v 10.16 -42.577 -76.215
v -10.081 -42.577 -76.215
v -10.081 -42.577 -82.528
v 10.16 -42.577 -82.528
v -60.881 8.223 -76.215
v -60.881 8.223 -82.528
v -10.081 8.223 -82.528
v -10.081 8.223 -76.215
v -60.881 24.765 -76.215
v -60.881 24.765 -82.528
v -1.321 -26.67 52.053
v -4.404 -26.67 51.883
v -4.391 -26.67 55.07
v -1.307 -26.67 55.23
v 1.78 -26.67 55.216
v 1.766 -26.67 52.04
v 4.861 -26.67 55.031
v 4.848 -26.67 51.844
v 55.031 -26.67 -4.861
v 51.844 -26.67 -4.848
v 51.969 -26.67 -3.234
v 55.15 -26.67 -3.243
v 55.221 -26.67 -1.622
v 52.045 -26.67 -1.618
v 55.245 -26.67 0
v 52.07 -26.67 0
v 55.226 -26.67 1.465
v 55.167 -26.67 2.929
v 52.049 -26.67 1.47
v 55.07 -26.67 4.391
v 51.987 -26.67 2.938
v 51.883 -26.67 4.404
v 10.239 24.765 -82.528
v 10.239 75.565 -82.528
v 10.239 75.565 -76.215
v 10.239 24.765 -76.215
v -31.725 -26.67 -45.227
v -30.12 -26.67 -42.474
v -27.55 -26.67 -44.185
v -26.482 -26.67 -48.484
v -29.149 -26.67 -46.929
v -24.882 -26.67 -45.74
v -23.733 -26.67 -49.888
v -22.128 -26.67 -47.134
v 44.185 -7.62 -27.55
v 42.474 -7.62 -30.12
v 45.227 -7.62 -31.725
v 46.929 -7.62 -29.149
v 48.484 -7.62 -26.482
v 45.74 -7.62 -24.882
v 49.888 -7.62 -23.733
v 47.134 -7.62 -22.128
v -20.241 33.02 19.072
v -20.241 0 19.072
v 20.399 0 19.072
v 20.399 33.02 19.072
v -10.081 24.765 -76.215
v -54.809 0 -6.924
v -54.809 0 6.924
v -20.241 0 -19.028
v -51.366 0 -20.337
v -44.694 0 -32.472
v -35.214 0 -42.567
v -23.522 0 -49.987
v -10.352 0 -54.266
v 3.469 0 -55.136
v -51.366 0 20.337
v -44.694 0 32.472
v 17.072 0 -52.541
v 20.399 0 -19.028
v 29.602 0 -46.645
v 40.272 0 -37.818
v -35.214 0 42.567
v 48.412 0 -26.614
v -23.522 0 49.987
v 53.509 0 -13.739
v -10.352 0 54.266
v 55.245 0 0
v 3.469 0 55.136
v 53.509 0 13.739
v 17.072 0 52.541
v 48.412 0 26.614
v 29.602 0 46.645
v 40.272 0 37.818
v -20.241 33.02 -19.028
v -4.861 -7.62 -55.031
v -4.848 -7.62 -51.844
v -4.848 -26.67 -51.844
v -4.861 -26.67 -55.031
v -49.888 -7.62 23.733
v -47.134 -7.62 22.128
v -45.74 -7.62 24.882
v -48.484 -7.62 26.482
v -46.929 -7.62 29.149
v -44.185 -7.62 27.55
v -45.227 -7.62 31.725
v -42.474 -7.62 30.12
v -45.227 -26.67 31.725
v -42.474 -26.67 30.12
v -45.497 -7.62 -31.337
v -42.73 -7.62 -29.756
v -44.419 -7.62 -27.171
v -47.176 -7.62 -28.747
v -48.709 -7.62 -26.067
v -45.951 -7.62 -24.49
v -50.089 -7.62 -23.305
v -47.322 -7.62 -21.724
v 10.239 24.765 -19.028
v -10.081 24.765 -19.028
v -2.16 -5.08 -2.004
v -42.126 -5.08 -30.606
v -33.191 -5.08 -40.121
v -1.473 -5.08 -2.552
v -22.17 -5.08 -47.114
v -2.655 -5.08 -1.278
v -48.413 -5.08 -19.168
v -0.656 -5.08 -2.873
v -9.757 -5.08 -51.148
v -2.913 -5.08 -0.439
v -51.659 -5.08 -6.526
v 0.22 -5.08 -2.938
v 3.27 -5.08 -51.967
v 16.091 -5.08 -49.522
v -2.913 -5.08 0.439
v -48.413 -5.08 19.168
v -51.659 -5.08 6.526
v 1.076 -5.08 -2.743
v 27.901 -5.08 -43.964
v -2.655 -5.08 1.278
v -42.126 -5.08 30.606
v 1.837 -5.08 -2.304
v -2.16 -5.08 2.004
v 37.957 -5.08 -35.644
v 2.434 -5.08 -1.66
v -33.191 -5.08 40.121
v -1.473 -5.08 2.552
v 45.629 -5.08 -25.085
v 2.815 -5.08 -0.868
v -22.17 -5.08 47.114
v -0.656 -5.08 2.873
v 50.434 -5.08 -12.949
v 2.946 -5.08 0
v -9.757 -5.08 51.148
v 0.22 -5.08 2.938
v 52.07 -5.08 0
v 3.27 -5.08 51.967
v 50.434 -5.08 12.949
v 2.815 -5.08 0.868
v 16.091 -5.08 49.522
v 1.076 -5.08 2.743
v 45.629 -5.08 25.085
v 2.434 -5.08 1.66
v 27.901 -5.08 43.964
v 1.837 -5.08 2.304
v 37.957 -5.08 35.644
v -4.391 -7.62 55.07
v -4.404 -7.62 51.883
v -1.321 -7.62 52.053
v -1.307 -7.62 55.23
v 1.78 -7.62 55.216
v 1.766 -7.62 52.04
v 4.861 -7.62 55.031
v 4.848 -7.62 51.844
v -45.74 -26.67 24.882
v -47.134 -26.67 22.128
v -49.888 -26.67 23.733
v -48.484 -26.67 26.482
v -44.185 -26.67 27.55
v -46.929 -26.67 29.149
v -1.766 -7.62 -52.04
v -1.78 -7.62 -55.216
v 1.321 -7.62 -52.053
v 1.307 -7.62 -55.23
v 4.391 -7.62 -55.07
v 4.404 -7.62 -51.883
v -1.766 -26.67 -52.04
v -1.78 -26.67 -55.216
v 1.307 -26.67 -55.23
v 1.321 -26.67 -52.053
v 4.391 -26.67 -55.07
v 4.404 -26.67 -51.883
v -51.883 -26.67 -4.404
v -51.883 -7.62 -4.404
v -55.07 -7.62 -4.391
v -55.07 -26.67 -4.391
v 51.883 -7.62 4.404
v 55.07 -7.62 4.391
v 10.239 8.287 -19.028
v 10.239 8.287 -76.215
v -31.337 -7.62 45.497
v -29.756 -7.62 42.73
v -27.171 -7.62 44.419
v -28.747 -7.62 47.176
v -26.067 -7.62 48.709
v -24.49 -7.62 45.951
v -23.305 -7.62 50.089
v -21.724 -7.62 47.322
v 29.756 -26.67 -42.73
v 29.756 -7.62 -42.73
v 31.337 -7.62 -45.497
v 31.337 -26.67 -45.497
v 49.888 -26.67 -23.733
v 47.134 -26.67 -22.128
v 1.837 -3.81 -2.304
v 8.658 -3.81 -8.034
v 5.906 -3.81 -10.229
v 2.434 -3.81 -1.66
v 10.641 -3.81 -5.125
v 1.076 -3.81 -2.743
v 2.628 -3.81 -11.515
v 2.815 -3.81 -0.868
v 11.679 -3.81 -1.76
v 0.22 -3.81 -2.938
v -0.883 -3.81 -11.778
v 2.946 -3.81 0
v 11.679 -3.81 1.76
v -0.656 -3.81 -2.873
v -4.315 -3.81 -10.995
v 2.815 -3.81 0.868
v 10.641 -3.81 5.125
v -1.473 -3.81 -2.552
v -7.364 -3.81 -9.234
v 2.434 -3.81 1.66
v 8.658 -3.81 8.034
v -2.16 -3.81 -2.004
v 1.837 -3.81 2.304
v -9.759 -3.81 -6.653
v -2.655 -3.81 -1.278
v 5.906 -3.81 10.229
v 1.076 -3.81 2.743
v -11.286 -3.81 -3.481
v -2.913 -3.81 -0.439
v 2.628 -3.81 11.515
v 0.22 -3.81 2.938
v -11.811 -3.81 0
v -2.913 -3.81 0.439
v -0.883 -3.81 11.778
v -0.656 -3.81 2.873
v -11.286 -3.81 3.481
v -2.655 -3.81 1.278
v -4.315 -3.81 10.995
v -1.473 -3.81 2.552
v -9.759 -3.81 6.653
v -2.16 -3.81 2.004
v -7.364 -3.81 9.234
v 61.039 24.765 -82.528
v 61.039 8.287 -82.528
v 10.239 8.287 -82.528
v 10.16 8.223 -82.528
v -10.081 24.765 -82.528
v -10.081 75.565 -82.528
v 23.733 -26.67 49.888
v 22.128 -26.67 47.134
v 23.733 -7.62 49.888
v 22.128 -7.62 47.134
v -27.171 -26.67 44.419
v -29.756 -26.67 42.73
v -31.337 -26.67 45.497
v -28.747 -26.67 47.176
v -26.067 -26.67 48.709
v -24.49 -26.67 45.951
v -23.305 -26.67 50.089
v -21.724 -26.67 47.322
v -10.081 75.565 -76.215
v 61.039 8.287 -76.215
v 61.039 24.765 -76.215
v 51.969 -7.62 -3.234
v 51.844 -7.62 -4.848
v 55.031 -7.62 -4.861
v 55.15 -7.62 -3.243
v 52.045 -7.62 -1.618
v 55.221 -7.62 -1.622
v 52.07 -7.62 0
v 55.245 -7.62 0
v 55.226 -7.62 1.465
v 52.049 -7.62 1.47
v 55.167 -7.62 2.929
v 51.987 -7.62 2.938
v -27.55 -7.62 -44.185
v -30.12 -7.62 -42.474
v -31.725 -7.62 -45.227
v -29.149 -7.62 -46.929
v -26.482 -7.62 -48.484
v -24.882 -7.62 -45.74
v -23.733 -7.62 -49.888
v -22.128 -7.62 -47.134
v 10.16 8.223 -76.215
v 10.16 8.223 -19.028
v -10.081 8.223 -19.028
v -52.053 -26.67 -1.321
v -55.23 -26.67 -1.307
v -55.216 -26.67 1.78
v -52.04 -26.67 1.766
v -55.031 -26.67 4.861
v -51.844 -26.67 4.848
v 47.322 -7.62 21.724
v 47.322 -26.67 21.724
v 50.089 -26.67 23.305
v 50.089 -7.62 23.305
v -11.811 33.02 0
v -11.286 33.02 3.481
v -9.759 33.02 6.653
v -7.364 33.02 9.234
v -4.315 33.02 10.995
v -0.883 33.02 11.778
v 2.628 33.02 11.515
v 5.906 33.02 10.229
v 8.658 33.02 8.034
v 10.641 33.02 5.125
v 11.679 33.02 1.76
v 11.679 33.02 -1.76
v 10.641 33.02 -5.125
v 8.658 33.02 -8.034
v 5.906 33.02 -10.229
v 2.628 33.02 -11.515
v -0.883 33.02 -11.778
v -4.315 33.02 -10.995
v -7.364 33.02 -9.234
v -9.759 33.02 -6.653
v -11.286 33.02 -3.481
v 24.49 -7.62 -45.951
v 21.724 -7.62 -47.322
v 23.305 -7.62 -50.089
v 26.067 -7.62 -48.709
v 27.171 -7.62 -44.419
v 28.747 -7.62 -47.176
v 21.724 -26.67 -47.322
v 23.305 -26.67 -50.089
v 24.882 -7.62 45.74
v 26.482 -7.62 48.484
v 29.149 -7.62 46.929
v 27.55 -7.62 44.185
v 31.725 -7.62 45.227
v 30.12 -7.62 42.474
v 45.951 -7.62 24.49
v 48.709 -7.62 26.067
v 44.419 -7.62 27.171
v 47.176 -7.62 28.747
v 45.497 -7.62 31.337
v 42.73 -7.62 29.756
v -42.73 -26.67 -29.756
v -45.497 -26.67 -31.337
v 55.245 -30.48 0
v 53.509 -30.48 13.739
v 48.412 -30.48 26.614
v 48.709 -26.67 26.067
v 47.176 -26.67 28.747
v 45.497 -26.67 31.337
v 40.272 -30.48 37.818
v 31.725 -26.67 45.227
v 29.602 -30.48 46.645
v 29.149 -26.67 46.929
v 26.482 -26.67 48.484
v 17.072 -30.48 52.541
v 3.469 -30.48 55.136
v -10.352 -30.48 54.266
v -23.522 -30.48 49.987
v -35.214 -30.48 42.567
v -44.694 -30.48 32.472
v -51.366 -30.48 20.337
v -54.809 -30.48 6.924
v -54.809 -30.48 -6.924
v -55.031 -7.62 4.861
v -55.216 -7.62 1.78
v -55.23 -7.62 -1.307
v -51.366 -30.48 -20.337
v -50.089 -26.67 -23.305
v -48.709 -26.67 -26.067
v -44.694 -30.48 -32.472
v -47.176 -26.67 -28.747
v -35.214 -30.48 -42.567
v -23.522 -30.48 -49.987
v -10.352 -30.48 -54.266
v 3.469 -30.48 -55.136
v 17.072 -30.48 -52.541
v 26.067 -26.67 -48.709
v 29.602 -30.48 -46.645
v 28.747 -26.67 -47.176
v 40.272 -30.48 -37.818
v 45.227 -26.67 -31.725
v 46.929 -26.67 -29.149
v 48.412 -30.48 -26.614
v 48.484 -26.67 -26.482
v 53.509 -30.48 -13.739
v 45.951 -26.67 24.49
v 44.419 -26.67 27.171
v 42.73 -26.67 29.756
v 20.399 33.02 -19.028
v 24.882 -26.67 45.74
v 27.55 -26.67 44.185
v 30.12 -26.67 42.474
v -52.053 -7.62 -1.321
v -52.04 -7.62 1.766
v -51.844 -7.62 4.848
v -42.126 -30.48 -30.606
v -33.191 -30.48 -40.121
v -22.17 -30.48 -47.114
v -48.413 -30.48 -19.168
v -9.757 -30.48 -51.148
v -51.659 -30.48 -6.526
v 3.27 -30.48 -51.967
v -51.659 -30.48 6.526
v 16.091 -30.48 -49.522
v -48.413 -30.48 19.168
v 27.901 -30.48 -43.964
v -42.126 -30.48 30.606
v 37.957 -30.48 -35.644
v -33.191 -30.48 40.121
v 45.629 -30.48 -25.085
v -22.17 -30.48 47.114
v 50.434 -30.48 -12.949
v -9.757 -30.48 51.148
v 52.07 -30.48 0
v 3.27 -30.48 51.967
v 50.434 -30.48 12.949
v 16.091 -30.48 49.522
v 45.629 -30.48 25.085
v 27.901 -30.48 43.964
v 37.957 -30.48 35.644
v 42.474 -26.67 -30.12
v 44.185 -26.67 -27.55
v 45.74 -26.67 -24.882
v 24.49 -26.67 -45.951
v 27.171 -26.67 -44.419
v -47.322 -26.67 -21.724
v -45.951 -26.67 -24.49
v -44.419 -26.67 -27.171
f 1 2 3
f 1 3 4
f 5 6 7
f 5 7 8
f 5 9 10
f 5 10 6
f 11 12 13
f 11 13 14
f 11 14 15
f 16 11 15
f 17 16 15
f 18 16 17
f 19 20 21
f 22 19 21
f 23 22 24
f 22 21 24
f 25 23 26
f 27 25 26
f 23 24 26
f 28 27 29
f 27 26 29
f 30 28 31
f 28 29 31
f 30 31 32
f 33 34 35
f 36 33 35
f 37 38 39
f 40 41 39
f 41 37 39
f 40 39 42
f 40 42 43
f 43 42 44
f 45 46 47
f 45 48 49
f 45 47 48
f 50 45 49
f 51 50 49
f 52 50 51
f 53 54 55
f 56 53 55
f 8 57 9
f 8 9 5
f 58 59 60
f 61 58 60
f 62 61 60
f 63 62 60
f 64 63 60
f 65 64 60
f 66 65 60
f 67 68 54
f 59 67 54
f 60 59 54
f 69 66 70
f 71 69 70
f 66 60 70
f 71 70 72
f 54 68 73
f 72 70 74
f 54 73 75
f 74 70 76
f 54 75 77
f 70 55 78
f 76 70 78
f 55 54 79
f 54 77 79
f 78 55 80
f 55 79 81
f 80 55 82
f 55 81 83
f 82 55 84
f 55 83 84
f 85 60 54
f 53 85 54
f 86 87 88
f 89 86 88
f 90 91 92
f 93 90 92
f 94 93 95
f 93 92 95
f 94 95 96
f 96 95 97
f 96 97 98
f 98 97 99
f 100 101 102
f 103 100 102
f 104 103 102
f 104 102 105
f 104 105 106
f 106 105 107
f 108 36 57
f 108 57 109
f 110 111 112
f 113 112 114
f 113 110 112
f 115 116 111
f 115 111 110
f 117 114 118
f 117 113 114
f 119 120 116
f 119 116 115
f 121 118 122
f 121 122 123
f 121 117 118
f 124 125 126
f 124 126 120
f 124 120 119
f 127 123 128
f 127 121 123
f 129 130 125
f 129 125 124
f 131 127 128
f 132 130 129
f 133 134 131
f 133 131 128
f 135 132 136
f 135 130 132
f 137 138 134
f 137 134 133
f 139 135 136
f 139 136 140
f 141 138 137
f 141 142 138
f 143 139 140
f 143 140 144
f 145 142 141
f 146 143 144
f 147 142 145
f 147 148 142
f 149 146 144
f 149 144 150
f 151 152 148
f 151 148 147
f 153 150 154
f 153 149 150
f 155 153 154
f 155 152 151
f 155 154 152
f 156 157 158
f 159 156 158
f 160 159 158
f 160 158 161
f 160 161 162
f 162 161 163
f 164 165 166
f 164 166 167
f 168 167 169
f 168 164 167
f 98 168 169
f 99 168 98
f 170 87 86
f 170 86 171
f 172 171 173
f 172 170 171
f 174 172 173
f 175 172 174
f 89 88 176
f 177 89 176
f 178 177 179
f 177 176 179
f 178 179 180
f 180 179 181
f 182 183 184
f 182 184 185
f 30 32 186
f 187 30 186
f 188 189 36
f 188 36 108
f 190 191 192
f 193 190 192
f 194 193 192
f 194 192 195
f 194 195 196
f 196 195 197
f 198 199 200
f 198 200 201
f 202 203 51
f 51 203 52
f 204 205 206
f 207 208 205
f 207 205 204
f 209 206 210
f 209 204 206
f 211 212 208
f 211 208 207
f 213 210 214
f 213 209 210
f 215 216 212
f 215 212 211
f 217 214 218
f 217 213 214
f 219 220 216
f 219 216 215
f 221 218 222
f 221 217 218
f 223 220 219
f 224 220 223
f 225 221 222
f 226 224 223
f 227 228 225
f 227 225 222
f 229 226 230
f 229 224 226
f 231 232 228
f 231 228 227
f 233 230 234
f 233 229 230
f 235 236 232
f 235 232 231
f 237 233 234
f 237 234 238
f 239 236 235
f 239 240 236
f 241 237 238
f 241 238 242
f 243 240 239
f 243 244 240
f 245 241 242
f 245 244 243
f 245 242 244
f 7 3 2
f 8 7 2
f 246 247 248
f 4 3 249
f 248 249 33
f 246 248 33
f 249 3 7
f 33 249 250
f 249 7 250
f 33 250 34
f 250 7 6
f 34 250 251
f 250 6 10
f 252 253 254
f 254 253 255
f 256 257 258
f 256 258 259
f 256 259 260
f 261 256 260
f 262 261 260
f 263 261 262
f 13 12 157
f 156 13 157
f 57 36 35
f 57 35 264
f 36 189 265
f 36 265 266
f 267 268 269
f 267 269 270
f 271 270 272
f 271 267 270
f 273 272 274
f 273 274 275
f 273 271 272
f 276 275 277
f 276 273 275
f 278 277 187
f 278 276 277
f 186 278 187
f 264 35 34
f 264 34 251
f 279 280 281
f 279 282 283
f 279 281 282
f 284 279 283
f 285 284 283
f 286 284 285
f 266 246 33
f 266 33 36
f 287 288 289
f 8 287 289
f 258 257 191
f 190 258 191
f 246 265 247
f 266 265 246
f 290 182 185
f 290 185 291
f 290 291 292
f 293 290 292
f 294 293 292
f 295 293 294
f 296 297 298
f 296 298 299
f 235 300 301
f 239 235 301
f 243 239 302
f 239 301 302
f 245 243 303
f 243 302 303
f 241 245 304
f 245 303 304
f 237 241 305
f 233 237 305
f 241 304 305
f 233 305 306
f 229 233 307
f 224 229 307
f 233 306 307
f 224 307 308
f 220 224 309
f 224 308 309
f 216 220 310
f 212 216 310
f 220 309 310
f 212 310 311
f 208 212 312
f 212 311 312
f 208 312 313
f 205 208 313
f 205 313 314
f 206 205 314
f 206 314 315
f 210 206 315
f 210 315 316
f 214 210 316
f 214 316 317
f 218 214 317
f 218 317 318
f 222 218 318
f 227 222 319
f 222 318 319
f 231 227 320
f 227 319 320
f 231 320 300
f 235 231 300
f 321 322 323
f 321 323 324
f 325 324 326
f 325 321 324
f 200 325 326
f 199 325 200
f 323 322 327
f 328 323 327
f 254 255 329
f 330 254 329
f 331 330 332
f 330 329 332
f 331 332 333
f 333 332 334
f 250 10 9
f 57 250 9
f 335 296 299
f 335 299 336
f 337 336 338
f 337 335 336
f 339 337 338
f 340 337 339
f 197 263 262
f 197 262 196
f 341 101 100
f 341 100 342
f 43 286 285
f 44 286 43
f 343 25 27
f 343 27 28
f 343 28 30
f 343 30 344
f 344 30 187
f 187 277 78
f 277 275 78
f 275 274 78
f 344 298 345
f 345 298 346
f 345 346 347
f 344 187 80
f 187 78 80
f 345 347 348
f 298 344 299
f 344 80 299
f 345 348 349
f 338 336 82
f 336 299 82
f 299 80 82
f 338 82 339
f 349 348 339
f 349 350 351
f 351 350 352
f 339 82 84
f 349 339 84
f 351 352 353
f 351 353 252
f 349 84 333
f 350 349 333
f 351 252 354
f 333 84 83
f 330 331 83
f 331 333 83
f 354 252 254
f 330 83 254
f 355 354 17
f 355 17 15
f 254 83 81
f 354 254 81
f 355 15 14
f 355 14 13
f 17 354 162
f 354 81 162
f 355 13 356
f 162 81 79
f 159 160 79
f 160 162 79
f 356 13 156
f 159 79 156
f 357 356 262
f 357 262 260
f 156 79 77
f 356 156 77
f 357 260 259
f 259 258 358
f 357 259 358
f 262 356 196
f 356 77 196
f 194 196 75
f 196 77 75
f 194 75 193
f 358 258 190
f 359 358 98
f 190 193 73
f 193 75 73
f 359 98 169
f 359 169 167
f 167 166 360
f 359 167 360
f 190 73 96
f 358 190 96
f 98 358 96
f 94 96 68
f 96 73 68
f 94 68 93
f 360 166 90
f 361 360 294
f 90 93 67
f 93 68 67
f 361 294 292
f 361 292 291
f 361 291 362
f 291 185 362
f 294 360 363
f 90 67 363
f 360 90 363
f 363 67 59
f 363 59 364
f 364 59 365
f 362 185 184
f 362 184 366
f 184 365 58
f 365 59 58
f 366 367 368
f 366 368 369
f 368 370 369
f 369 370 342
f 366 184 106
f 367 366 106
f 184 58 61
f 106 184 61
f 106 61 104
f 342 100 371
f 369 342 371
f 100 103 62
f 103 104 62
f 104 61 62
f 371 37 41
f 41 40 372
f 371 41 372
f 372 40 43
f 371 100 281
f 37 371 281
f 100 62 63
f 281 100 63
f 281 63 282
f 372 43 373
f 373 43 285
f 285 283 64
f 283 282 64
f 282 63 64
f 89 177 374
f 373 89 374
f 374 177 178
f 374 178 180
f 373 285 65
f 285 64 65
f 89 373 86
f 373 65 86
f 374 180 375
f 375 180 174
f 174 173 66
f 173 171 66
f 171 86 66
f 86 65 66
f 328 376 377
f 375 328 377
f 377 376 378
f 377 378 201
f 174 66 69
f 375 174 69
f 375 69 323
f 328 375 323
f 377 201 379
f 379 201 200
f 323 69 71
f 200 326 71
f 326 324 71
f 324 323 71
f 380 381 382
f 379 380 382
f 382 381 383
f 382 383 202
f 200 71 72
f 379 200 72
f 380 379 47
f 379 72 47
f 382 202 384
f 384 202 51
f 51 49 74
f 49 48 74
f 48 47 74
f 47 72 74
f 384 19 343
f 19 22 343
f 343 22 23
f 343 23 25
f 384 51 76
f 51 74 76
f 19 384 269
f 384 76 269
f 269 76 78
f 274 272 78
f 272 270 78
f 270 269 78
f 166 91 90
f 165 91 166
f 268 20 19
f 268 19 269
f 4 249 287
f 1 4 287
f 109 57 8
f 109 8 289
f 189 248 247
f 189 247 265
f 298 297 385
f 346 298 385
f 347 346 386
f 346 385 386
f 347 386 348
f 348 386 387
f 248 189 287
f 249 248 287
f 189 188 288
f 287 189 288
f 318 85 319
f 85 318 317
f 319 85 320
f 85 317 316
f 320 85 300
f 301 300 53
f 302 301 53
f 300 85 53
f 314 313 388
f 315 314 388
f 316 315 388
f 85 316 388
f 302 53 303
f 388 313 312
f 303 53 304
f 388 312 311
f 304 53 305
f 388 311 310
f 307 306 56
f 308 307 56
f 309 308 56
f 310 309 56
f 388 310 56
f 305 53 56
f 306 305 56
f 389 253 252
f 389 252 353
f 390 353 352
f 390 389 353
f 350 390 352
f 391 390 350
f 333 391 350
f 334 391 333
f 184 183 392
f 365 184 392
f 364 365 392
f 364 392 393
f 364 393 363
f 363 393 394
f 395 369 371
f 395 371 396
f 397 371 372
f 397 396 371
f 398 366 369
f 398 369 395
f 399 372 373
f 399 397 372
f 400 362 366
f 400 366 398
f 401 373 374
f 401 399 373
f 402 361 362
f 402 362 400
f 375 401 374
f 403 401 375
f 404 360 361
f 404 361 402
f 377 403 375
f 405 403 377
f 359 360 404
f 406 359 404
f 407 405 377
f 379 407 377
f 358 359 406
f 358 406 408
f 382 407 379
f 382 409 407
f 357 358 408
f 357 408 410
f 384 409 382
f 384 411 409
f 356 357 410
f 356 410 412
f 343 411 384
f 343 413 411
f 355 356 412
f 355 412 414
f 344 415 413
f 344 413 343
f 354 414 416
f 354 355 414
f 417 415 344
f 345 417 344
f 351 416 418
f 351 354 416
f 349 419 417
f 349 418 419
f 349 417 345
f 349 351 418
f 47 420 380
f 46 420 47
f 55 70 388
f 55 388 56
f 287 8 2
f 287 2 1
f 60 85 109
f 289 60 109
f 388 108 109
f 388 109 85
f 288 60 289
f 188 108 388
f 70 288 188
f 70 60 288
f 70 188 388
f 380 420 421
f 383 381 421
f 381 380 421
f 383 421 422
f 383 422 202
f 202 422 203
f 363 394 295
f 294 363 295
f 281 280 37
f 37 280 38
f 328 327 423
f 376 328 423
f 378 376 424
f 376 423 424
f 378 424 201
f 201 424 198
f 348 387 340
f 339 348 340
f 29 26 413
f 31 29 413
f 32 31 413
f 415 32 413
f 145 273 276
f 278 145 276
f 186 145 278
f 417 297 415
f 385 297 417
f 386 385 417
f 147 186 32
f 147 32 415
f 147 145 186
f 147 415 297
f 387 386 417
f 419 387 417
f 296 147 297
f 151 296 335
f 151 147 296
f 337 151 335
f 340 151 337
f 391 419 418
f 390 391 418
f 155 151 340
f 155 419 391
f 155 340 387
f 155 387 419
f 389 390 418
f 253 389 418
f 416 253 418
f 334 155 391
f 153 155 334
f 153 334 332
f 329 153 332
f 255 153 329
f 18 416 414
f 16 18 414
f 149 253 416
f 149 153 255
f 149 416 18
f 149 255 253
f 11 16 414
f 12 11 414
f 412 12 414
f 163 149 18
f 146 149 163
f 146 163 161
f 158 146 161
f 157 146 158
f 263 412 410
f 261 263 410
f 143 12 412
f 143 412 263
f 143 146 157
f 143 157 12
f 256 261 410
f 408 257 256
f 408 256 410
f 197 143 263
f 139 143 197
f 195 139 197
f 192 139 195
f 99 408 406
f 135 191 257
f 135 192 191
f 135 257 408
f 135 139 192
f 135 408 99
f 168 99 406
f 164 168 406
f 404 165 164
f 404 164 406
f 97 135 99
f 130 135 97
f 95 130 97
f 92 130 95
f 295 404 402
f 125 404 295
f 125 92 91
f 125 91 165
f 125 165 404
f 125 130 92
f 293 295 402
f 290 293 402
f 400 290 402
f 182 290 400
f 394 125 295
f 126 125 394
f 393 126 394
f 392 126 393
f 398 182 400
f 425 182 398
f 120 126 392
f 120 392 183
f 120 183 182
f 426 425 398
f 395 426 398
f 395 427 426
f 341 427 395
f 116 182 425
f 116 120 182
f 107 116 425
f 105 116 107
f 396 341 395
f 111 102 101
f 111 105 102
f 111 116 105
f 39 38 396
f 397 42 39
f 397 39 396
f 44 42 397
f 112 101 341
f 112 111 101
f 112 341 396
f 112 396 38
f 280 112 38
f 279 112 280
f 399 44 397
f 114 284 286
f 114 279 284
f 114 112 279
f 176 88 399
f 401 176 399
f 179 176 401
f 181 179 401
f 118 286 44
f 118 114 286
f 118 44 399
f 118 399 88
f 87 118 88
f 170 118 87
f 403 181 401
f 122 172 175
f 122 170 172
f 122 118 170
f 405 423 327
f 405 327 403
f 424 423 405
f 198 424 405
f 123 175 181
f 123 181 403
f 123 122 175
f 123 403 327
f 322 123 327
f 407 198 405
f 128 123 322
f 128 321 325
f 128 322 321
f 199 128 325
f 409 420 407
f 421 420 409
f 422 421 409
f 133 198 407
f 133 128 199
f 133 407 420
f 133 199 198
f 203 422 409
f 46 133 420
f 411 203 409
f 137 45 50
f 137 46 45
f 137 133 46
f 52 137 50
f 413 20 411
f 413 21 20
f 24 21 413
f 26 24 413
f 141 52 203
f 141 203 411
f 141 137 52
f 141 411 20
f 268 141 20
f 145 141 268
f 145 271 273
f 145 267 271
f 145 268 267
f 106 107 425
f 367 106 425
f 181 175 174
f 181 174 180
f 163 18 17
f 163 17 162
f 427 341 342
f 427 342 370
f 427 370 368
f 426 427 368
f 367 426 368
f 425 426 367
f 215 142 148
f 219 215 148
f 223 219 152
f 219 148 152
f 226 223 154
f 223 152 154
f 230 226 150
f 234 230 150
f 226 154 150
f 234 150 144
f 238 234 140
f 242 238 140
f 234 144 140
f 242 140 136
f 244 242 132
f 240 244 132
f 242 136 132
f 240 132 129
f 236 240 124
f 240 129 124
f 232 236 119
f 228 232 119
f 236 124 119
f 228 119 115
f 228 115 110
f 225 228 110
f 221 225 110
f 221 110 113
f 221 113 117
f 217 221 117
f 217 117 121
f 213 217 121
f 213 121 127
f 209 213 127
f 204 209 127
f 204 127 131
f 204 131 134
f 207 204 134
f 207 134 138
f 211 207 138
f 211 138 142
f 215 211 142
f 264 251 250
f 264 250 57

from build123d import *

# Parameters (mm, degrees)
F0_R      = 52.07
F1_DEPTH  = 5.08
F0_R_2    = 55.245
F2_DEPTH  = 30.48
F4_DEPTH  = 21.59
F5_W      = 9.2520020868
F5_H      = 19.05
F6_DEPTH  = 50.8
F7_W      = 9.2520020868
F7_H      = 19.05
F8_DEPTH  = 50.8
F9_W      = 9.2520020868
F9_H      = 19.05
F10_DEPTH = 50.8
F11_W     = 19.05
F11_H     = 9.2520020868
F12_DEPTH = 50.8
F13_W     = 19.05
F13_H     = 9.2520020868
F14_DEPTH = 50.8
F15_W     = 19.05
F15_H     = 9.2520020868
F16_DEPTH = 50.8
F17_W     = 9.2520020868
F17_H     = 19.05
F18_DEPTH = 50.8
F19_W     = 9.2520020868
F19_H     = 19.05
F20_DEPTH = 50.8
F21_W     = 9.2520020868
F21_H     = 19.05
F22_DEPTH = 50.8
F23_W     = 19.05
F23_H     = 9.2520020868
F24_DEPTH = 50.8
F25_W     = 19.05
F25_H     = 9.2520020868
F26_DEPTH = 50.8
F27_W     = 19.05
F27_H     = 9.2520020868
F28_DEPTH = 50.8
F29_W     = 40.64
F29_H     = 38.1
F30_DEPTH = 33.02
F31_DEPTH = 21.59
F33_DEPTH = 63.5
F34_W     = 20.2407714686
F34_H     = 6.3127256824
F35_DEPTH = 50.8
F36_W     = 16.5421865909
F36_H     = 6.3127256824
F37_DEPTH = 50.8
F38_W     = 20.32
F38_H     = 6.3127256824
F39_DEPTH = 50.8
F40_W     = 16.4780624607
F40_H     = 6.3127256824
F41_DEPTH = 50.8
F43_R     = 2.9464
F44_DEPTH = 1.6256
F42_R     = 11.811
F45_DEPTH = 36.83


with BuildPart() as f1:
    # F0 (on Front) → F1 (new body)
    with BuildSketch(Plane.XZ):
        Circle(F0_R)
    extrude(amount=F1_DEPTH)

    # F0 (on Front) → F2 (join)
    with BuildSketch(Plane.XZ):
        Circle(F0_R_2)
        Circle(F0_R, mode=Mode.SUBTRACT)
    extrude(amount=F2_DEPTH)

    # F3 (on face) → F4 (join)
    with BuildSketch(Plane.XZ.offset(5.08)):
        Polygon((4.5521322669, -17.2840948262), (12.5843095976, -12.6923990675), (17.2445313344, -4.6997852286), (17.2840948262, 4.5521322669), (12.6923990675, 12.5843095976), (4.6997852286, 17.2445313344), (-4.5521322669, 17.2840948262), (-12.5843095976, 12.6923990675), (-17.2445313344, 4.6997852286), (-17.2840948262, -4.5521322669), (-12.6923990675, -12.5843095976), (-4.6997852286, -17.2445313344), align=None)
    extrude(amount=F4_DEPTH)

    # F5 (on face) → F6 (cut)
    with BuildSketch(Plane(origin=(8.696092148, 0, 14.914420466), x_dir=(0.8638793813, 0, -0.5036987339), z_dir=(0.5036987339, 0, 0.8638793813))):
        with Locations((0, -17.145)):
            Rectangle(F5_W, F5_H)
    extrude(amount=F6_DEPTH, mode=Mode.SUBTRACT)

    # F7 (on face) → F8 (cut)
    with BuildSketch(Plane(origin=(0.0738264808, 0, 17.2643130803), x_dir=(0.999990857, 0, -0.0042762087), z_dir=(0.0042762087, 0, 0.999990857))):
        with Locations((0, -17.145)):
            Rectangle(F7_W, F7_H)
    extrude(amount=F8_DEPTH, mode=Mode.SUBTRACT)

    # F9 (on face) → F10 (cut)
    with BuildSketch(Plane(origin=(-8.5682209323, 0, 14.9882469469), x_dir=(0.86815559, 0, 0.4962921231), z_dir=(-0.4962921231, 0, 0.86815559))):
        with Locations((0, -17.145)):
            Rectangle(F9_W, F9_H)
    extrude(amount=F10_DEPTH, mode=Mode.SUBTRACT)

    # F11 (on face) → F12 (cut)
    with BuildSketch(Plane(origin=(-14.914420466, 0, 8.696092148), x_dir=(0, -1, 0), z_dir=(-0.8638793813, 0, 0.5036987339))):
        with Locations((17.145, 0)):
            Rectangle(F11_W, F11_H)
    extrude(amount=F12_DEPTH, mode=Mode.SUBTRACT)

    # F13 (on face) → F14 (cut)
    with BuildSketch(Plane(origin=(-17.2643130803, 0, 0.0738264808), x_dir=(0, -1, 0), z_dir=(-0.999990857, 0, 0.0042762087))):
        with Locations((17.145, 0)):
            Rectangle(F13_W, F13_H)
    extrude(amount=F14_DEPTH, mode=Mode.SUBTRACT)

    # F15 (on face) → F16 (cut)
    with BuildSketch(Plane(origin=(-14.9882469469, 0, -8.5682209323), x_dir=(0, -1, 0), z_dir=(-0.86815559, 0, -0.4962921231))):
        with Locations((17.145, 0)):
            Rectangle(F15_W, F15_H)
    extrude(amount=F16_DEPTH, mode=Mode.SUBTRACT)

    # F17 (on face) → F18 (cut)
    with BuildSketch(Plane(origin=(-8.696092148, 0, -14.914420466), x_dir=(0.8638793813, 0, -0.5036987339), z_dir=(-0.5036987339, 0, -0.8638793813))):
        with Locations((0, 17.145)):
            Rectangle(F17_W, F17_H)
    extrude(amount=F18_DEPTH, mode=Mode.SUBTRACT)

    # F19 (on face) → F20 (cut)
    with BuildSketch(Plane(origin=(-0.0738264808, 0, -17.2643130803), x_dir=(0.999990857, 0, -0.0042762087), z_dir=(-0.0042762087, 0, -0.999990857))):
        with Locations((0, 17.145)):
            Rectangle(F19_W, F19_H)
    extrude(amount=F20_DEPTH, mode=Mode.SUBTRACT)

    # F21 (on face) → F22 (cut)
    with BuildSketch(Plane(origin=(8.5682209323, 0, -14.9882469469), x_dir=(0.86815559, 0, 0.4962921231), z_dir=(0.4962921231, 0, -0.86815559))):
        with Locations((0, 17.145)):
            Rectangle(F21_W, F21_H)
    extrude(amount=F22_DEPTH, mode=Mode.SUBTRACT)

    # F23 (on face) → F24 (cut)
    with BuildSketch(Plane(origin=(14.914420466, 0, -8.696092148), x_dir=(0, 1, 0), z_dir=(0.8638793813, 0, -0.5036987339))):
        with Locations((-17.145, 0)):
            Rectangle(F23_W, F23_H)
    extrude(amount=F24_DEPTH, mode=Mode.SUBTRACT)

    # F25 (on face) → F26 (cut)
    with BuildSketch(Plane(origin=(17.2643130803, 0, -0.0738264808), x_dir=(0, 1, 0), z_dir=(0.999990857, 0, -0.0042762087))):
        with Locations((-17.145, 0)):
            Rectangle(F25_W, F25_H)
    extrude(amount=F26_DEPTH, mode=Mode.SUBTRACT)

    # F27 (on face) → F28 (cut)
    with BuildSketch(Plane(origin=(14.9882469469, 0, 8.5682209323), x_dir=(0, 1, 0), z_dir=(0.86815559, 0, 0.4962921231))):
        with Locations((-17.145, 0)):
            Rectangle(F27_W, F27_H)
    extrude(amount=F28_DEPTH, mode=Mode.SUBTRACT)

    # F29 (on face) → F30 (join)
    with BuildSketch(Plane.XZ):
        with Locations((0.0789208158, 0.021902828)):
            Rectangle(F29_W, F29_H)
    extrude(amount=-F30_DEPTH)

    # F31 (cut): a face of the model
    f31_faces = [f1.faces().sort_by_distance(p)[0] for p in [
        (0, -26.67, 0),
    ]]
    extrude(f31_faces, amount=-F31_DEPTH, mode=Mode.SUBTRACT)

    # F32 (on face) → F33 (join)
    with BuildSketch(Plane(origin=(0, 0, -19.028097172), x_dir=(1, 0, 0), z_dir=(0, 0, -1))):
        Polygon((-10.0810791842, -8.2228134091), (-10.0810791842, -24.765), (10.2389208158, -24.765), (10.2389208158, -8.2869375393), (10.1596922844, -8.2228134091), align=None)
    extrude(amount=F33_DEPTH)

    # F34 (on face) → F35 (join)
    with BuildSketch(Plane.XZ.offset(-8.2228134091)):
        with Locations((0.0393065501, -79.3717343307)):
            Rectangle(F34_W, F34_H)
    extrude(amount=F35_DEPTH)

    # F36 (on face) → F37 (join)
    with BuildSketch(Plane(origin=(-10.0810791842, 0, 0), x_dir=(0, -1, 0), z_dir=(-1, 0, 0))):
        with Locations((-16.4939067046, -79.3717343307)):
            Rectangle(F36_W, F36_H)
    extrude(amount=F37_DEPTH)

    # F38 (on face) → F39 (join)
    with BuildSketch(Plane(origin=(0, 24.765, 0), x_dir=(-1, 0, 0), z_dir=(0, 1, 0))):
        with Locations((-0.0789208158, -79.3717343307)):
            Rectangle(F38_W, F38_H)
    extrude(amount=F39_DEPTH)

    # F40 (on face) → F41 (join)
    with BuildSketch(Plane.YZ.offset(10.2389208158)):
        with Locations((16.5259687696, -79.3717343307)):
            Rectangle(F40_W, F40_H)
    extrude(amount=F41_DEPTH)

    # F43 (on face) → F44 (cut)
    with BuildSketch(Plane.XZ.offset(5.08)):
        Circle(F43_R)
    extrude(amount=-F44_DEPTH, mode=Mode.SUBTRACT)

    # F42 (on face) → F45 (cut)
    with BuildSketch(Plane(origin=(0, 33.02, 0), x_dir=(-1, 0, 0), z_dir=(0, 1, 0))):
        Circle(F42_R)
    extrude(amount=-F45_DEPTH, mode=Mode.SUBTRACT)


solid = f1.part
